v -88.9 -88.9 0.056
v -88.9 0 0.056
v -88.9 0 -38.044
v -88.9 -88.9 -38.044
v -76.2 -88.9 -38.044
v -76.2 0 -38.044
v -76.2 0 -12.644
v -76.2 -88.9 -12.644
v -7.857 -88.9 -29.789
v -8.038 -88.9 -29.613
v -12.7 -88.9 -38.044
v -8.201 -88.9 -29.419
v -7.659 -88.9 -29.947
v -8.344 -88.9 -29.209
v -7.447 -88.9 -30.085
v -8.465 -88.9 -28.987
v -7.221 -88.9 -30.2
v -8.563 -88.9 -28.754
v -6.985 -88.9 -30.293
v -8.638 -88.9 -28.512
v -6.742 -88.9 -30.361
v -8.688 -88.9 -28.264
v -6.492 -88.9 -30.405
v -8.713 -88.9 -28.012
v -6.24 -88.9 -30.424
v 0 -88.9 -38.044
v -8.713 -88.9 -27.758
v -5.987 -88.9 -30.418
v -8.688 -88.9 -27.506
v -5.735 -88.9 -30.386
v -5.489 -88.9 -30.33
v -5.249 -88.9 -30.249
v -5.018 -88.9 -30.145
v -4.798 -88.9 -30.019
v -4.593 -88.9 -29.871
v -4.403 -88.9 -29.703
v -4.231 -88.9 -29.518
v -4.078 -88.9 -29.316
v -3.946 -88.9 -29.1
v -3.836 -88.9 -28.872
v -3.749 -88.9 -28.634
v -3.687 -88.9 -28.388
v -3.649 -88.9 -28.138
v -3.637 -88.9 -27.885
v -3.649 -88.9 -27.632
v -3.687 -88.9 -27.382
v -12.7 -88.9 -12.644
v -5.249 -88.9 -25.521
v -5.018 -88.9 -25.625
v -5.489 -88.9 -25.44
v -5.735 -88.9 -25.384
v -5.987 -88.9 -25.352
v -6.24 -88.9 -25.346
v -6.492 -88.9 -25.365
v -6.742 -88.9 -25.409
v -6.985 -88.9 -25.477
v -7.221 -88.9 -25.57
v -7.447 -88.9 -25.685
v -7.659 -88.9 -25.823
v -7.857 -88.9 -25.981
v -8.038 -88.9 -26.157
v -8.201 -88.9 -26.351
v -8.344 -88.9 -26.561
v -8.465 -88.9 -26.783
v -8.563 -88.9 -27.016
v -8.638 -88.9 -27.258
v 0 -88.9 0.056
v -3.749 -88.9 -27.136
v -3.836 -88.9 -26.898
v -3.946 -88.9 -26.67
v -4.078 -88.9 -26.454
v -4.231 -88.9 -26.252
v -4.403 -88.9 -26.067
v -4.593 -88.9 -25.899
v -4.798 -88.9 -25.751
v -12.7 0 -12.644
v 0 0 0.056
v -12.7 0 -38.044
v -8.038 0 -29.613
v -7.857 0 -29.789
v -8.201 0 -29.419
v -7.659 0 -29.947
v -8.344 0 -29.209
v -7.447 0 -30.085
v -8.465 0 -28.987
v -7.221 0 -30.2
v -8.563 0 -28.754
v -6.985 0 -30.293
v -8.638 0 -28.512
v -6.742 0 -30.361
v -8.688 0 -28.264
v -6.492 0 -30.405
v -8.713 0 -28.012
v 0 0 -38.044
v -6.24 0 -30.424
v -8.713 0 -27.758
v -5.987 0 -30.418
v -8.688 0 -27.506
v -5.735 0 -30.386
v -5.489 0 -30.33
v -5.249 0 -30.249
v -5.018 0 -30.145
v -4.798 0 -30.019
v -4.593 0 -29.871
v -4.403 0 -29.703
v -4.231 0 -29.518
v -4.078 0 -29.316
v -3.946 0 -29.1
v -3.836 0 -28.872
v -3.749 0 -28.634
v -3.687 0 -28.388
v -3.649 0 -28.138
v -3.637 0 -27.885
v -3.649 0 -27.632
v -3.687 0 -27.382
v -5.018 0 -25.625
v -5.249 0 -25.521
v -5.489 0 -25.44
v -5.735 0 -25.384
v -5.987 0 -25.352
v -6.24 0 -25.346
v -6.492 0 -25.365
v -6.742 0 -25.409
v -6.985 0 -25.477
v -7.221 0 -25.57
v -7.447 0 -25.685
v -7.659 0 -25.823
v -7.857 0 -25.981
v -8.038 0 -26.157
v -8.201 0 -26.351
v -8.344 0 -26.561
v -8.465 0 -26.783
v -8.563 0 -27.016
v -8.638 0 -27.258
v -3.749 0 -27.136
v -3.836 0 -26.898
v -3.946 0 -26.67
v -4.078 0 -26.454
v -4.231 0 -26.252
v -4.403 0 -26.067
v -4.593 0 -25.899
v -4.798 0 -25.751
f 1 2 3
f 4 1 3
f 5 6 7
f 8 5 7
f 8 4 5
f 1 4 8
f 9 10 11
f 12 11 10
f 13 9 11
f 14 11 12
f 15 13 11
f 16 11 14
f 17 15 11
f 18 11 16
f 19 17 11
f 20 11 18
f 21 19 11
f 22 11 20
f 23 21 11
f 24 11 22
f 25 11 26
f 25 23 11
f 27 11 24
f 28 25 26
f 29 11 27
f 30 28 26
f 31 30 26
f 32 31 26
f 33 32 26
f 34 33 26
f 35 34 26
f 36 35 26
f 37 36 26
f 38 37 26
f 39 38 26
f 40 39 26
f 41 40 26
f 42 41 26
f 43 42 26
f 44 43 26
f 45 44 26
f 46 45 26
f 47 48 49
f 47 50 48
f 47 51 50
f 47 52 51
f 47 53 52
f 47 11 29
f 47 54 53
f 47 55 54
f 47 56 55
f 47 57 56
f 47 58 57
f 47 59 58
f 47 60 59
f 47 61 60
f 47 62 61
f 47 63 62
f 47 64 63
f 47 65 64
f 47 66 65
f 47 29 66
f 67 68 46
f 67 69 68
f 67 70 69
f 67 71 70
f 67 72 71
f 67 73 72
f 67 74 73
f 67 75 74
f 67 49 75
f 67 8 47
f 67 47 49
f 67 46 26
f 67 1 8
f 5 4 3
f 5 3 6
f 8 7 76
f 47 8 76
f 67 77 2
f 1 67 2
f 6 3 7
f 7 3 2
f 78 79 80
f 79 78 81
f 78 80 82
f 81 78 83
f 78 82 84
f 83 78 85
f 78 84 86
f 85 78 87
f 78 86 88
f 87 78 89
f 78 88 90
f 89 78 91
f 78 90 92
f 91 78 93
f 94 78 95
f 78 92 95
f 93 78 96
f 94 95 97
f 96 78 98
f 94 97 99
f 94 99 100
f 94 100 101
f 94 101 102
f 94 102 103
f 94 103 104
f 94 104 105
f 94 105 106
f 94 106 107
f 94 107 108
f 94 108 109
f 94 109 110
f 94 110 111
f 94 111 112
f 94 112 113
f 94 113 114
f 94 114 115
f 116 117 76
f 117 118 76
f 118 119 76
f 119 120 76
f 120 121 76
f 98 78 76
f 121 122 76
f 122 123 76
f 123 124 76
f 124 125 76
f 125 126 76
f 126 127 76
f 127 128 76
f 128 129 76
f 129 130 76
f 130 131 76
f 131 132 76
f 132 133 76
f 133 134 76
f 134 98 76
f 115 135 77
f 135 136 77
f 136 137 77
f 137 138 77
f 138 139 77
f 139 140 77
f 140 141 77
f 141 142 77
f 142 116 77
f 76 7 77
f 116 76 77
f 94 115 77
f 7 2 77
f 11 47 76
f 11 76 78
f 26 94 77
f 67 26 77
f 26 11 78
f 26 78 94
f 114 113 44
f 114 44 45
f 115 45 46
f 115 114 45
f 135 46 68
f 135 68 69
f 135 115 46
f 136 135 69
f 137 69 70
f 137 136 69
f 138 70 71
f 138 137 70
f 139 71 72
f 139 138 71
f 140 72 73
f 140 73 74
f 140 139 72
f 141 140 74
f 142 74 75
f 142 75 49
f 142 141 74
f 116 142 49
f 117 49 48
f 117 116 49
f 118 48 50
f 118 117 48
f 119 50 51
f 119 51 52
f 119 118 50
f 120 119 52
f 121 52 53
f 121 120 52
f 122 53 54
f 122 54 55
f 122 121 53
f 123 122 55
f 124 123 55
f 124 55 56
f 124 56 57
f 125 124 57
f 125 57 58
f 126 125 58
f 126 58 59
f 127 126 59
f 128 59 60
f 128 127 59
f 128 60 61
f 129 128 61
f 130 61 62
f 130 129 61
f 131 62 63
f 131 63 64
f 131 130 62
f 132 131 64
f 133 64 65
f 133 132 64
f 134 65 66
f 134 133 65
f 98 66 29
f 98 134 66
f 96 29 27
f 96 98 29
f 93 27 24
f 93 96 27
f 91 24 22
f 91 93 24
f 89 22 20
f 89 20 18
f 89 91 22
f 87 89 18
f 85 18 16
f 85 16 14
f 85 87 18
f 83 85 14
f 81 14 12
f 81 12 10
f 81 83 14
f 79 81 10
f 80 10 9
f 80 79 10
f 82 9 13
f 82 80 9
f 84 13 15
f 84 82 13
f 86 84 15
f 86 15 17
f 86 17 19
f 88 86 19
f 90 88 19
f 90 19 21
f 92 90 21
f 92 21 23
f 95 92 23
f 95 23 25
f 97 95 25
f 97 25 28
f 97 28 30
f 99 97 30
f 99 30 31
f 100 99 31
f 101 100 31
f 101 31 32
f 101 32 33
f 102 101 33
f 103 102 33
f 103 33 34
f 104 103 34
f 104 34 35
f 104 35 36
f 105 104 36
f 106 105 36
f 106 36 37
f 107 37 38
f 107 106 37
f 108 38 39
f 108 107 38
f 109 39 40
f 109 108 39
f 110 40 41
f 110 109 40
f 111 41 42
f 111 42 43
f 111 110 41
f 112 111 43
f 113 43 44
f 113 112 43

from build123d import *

# Parameters (mm, degrees)
F0_R     = 2.54
F1_DEPTH = 88.9


with BuildPart() as f1:
    # F0 (on Front) → F1 (new body)
    with BuildSketch(Plane.XZ):
        Polygon((-88.9, -38.0440002276), (-76.2, -38.0440002276), (-76.2, -12.6440002276), (-12.7, -12.6440002276), (-12.7, -38.0440002276), (0, -38.0440002276), (0, 0.0559997724), (-88.9, 0.0559997724), (-88.9, -12.6440002276), align=None)
        with Locations((-6.1765108258, -27.8850197792)):
            Circle(F0_R, mode=Mode.SUBTRACT)
    extrude(amount=F1_DEPTH)


with BuildPart() as f1b:
    # F0 (on Front) → F1, piece 2 (new body)
    with BuildSketch(Plane.XZ):
        with Locations((-59.0428002179, -29.2415227741)):
            Circle(F0_R)
    extrude(amount=F1_DEPTH)


solid = f1.part
